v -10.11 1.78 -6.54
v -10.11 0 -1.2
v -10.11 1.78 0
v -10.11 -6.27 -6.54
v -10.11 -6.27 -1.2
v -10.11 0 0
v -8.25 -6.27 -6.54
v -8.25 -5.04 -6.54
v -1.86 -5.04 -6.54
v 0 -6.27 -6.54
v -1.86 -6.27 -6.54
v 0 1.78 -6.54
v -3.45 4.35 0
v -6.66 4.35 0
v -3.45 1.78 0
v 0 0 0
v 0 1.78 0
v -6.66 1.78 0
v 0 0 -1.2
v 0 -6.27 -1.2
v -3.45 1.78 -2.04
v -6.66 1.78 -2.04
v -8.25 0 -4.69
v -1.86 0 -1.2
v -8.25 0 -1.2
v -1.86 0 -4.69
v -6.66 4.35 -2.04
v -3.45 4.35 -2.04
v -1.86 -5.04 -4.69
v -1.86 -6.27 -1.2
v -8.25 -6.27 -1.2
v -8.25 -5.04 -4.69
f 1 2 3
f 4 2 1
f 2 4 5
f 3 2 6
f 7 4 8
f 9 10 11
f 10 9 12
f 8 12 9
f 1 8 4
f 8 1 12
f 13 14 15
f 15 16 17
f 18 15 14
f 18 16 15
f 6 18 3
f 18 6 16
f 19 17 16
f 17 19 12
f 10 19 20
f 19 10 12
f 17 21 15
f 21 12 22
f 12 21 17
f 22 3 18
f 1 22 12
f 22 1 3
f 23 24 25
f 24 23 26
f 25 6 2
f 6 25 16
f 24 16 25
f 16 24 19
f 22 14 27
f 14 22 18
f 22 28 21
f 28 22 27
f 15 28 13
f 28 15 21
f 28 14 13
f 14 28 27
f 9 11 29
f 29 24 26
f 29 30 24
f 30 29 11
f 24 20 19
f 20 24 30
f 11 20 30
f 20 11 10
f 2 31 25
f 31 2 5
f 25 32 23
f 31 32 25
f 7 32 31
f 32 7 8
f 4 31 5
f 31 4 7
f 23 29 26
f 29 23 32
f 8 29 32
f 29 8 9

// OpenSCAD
/*
 * Copyright ©2015 Laurence Gonsalves <laurence@xenomachina.com>
 *
 * This library is free software; you can redistribute it and/or
 * modify it under the terms of the GNU Lesser General Public
 * License as published by the Free Software Foundation; either
 * version 2.1 of the License, or any later version.
 *
 * This library is distributed in the hope that it will be useful,
 * but WITHOUT ANY WARRANTY; without even the implied warranty of
 * MERCHANTABILITY or FITNESS FOR A PARTICULAR PURPOSE.  See the GNU
 * Lesser General Public License for more details.
 *
 * You should have received a copy of the GNU Lesser General Public
 * License along with this library; if not, write to:
 *   Free Software Foundation, Inc.
 *   51 Franklin Street, Fifth Floor
 *   Boston, MA  02110-1301
 *   USA
 */

// This is the bracket for the Commodore 128's power LED. It looks like a tiny
// armchair with a tail, so the measurements are named as such.

// I have not actually printed this part. It should print pretty easily with
// support under the tail. The part isn't visible, so any ugnliness caused by
// removing support should be inconsequential.

ARM_WIDTH = 1.86;
ARM_DEPTH = 8.05;
ARM_HEIGHT = 5.34;
SEAT_DEPTH = 5.04;
SEAT_HEIGHT = 1.85;
BACK_WIDTH = 10.11;
BACK_HEIGHT = 6.54;
BACK_DEPTH = 1.78;
TAIL_WIDTH = 3.21;
TAIL_DEPTH = 4.35;
TAIL_HEIGHT = 2.04;

module main() {
    rotate([0,180,0])
        union() {
            cube([BACK_WIDTH, BACK_DEPTH, BACK_HEIGHT]);
            translate([BACK_WIDTH/2 - TAIL_WIDTH/2, 0, 0])
                cube([TAIL_WIDTH, TAIL_DEPTH, TAIL_HEIGHT]);
            translate([0, BACK_DEPTH - ARM_DEPTH, BACK_HEIGHT - ARM_HEIGHT])
                cube([ARM_WIDTH, ARM_DEPTH, ARM_HEIGHT]);
            translate([BACK_WIDTH - ARM_WIDTH, BACK_DEPTH - ARM_DEPTH, BACK_HEIGHT - ARM_HEIGHT])
                cube([ARM_WIDTH, ARM_DEPTH, ARM_HEIGHT]);
            translate([0, - SEAT_DEPTH, BACK_HEIGHT - SEAT_HEIGHT])
                cube([BACK_WIDTH, SEAT_DEPTH, SEAT_HEIGHT]);
        }
}

main();
